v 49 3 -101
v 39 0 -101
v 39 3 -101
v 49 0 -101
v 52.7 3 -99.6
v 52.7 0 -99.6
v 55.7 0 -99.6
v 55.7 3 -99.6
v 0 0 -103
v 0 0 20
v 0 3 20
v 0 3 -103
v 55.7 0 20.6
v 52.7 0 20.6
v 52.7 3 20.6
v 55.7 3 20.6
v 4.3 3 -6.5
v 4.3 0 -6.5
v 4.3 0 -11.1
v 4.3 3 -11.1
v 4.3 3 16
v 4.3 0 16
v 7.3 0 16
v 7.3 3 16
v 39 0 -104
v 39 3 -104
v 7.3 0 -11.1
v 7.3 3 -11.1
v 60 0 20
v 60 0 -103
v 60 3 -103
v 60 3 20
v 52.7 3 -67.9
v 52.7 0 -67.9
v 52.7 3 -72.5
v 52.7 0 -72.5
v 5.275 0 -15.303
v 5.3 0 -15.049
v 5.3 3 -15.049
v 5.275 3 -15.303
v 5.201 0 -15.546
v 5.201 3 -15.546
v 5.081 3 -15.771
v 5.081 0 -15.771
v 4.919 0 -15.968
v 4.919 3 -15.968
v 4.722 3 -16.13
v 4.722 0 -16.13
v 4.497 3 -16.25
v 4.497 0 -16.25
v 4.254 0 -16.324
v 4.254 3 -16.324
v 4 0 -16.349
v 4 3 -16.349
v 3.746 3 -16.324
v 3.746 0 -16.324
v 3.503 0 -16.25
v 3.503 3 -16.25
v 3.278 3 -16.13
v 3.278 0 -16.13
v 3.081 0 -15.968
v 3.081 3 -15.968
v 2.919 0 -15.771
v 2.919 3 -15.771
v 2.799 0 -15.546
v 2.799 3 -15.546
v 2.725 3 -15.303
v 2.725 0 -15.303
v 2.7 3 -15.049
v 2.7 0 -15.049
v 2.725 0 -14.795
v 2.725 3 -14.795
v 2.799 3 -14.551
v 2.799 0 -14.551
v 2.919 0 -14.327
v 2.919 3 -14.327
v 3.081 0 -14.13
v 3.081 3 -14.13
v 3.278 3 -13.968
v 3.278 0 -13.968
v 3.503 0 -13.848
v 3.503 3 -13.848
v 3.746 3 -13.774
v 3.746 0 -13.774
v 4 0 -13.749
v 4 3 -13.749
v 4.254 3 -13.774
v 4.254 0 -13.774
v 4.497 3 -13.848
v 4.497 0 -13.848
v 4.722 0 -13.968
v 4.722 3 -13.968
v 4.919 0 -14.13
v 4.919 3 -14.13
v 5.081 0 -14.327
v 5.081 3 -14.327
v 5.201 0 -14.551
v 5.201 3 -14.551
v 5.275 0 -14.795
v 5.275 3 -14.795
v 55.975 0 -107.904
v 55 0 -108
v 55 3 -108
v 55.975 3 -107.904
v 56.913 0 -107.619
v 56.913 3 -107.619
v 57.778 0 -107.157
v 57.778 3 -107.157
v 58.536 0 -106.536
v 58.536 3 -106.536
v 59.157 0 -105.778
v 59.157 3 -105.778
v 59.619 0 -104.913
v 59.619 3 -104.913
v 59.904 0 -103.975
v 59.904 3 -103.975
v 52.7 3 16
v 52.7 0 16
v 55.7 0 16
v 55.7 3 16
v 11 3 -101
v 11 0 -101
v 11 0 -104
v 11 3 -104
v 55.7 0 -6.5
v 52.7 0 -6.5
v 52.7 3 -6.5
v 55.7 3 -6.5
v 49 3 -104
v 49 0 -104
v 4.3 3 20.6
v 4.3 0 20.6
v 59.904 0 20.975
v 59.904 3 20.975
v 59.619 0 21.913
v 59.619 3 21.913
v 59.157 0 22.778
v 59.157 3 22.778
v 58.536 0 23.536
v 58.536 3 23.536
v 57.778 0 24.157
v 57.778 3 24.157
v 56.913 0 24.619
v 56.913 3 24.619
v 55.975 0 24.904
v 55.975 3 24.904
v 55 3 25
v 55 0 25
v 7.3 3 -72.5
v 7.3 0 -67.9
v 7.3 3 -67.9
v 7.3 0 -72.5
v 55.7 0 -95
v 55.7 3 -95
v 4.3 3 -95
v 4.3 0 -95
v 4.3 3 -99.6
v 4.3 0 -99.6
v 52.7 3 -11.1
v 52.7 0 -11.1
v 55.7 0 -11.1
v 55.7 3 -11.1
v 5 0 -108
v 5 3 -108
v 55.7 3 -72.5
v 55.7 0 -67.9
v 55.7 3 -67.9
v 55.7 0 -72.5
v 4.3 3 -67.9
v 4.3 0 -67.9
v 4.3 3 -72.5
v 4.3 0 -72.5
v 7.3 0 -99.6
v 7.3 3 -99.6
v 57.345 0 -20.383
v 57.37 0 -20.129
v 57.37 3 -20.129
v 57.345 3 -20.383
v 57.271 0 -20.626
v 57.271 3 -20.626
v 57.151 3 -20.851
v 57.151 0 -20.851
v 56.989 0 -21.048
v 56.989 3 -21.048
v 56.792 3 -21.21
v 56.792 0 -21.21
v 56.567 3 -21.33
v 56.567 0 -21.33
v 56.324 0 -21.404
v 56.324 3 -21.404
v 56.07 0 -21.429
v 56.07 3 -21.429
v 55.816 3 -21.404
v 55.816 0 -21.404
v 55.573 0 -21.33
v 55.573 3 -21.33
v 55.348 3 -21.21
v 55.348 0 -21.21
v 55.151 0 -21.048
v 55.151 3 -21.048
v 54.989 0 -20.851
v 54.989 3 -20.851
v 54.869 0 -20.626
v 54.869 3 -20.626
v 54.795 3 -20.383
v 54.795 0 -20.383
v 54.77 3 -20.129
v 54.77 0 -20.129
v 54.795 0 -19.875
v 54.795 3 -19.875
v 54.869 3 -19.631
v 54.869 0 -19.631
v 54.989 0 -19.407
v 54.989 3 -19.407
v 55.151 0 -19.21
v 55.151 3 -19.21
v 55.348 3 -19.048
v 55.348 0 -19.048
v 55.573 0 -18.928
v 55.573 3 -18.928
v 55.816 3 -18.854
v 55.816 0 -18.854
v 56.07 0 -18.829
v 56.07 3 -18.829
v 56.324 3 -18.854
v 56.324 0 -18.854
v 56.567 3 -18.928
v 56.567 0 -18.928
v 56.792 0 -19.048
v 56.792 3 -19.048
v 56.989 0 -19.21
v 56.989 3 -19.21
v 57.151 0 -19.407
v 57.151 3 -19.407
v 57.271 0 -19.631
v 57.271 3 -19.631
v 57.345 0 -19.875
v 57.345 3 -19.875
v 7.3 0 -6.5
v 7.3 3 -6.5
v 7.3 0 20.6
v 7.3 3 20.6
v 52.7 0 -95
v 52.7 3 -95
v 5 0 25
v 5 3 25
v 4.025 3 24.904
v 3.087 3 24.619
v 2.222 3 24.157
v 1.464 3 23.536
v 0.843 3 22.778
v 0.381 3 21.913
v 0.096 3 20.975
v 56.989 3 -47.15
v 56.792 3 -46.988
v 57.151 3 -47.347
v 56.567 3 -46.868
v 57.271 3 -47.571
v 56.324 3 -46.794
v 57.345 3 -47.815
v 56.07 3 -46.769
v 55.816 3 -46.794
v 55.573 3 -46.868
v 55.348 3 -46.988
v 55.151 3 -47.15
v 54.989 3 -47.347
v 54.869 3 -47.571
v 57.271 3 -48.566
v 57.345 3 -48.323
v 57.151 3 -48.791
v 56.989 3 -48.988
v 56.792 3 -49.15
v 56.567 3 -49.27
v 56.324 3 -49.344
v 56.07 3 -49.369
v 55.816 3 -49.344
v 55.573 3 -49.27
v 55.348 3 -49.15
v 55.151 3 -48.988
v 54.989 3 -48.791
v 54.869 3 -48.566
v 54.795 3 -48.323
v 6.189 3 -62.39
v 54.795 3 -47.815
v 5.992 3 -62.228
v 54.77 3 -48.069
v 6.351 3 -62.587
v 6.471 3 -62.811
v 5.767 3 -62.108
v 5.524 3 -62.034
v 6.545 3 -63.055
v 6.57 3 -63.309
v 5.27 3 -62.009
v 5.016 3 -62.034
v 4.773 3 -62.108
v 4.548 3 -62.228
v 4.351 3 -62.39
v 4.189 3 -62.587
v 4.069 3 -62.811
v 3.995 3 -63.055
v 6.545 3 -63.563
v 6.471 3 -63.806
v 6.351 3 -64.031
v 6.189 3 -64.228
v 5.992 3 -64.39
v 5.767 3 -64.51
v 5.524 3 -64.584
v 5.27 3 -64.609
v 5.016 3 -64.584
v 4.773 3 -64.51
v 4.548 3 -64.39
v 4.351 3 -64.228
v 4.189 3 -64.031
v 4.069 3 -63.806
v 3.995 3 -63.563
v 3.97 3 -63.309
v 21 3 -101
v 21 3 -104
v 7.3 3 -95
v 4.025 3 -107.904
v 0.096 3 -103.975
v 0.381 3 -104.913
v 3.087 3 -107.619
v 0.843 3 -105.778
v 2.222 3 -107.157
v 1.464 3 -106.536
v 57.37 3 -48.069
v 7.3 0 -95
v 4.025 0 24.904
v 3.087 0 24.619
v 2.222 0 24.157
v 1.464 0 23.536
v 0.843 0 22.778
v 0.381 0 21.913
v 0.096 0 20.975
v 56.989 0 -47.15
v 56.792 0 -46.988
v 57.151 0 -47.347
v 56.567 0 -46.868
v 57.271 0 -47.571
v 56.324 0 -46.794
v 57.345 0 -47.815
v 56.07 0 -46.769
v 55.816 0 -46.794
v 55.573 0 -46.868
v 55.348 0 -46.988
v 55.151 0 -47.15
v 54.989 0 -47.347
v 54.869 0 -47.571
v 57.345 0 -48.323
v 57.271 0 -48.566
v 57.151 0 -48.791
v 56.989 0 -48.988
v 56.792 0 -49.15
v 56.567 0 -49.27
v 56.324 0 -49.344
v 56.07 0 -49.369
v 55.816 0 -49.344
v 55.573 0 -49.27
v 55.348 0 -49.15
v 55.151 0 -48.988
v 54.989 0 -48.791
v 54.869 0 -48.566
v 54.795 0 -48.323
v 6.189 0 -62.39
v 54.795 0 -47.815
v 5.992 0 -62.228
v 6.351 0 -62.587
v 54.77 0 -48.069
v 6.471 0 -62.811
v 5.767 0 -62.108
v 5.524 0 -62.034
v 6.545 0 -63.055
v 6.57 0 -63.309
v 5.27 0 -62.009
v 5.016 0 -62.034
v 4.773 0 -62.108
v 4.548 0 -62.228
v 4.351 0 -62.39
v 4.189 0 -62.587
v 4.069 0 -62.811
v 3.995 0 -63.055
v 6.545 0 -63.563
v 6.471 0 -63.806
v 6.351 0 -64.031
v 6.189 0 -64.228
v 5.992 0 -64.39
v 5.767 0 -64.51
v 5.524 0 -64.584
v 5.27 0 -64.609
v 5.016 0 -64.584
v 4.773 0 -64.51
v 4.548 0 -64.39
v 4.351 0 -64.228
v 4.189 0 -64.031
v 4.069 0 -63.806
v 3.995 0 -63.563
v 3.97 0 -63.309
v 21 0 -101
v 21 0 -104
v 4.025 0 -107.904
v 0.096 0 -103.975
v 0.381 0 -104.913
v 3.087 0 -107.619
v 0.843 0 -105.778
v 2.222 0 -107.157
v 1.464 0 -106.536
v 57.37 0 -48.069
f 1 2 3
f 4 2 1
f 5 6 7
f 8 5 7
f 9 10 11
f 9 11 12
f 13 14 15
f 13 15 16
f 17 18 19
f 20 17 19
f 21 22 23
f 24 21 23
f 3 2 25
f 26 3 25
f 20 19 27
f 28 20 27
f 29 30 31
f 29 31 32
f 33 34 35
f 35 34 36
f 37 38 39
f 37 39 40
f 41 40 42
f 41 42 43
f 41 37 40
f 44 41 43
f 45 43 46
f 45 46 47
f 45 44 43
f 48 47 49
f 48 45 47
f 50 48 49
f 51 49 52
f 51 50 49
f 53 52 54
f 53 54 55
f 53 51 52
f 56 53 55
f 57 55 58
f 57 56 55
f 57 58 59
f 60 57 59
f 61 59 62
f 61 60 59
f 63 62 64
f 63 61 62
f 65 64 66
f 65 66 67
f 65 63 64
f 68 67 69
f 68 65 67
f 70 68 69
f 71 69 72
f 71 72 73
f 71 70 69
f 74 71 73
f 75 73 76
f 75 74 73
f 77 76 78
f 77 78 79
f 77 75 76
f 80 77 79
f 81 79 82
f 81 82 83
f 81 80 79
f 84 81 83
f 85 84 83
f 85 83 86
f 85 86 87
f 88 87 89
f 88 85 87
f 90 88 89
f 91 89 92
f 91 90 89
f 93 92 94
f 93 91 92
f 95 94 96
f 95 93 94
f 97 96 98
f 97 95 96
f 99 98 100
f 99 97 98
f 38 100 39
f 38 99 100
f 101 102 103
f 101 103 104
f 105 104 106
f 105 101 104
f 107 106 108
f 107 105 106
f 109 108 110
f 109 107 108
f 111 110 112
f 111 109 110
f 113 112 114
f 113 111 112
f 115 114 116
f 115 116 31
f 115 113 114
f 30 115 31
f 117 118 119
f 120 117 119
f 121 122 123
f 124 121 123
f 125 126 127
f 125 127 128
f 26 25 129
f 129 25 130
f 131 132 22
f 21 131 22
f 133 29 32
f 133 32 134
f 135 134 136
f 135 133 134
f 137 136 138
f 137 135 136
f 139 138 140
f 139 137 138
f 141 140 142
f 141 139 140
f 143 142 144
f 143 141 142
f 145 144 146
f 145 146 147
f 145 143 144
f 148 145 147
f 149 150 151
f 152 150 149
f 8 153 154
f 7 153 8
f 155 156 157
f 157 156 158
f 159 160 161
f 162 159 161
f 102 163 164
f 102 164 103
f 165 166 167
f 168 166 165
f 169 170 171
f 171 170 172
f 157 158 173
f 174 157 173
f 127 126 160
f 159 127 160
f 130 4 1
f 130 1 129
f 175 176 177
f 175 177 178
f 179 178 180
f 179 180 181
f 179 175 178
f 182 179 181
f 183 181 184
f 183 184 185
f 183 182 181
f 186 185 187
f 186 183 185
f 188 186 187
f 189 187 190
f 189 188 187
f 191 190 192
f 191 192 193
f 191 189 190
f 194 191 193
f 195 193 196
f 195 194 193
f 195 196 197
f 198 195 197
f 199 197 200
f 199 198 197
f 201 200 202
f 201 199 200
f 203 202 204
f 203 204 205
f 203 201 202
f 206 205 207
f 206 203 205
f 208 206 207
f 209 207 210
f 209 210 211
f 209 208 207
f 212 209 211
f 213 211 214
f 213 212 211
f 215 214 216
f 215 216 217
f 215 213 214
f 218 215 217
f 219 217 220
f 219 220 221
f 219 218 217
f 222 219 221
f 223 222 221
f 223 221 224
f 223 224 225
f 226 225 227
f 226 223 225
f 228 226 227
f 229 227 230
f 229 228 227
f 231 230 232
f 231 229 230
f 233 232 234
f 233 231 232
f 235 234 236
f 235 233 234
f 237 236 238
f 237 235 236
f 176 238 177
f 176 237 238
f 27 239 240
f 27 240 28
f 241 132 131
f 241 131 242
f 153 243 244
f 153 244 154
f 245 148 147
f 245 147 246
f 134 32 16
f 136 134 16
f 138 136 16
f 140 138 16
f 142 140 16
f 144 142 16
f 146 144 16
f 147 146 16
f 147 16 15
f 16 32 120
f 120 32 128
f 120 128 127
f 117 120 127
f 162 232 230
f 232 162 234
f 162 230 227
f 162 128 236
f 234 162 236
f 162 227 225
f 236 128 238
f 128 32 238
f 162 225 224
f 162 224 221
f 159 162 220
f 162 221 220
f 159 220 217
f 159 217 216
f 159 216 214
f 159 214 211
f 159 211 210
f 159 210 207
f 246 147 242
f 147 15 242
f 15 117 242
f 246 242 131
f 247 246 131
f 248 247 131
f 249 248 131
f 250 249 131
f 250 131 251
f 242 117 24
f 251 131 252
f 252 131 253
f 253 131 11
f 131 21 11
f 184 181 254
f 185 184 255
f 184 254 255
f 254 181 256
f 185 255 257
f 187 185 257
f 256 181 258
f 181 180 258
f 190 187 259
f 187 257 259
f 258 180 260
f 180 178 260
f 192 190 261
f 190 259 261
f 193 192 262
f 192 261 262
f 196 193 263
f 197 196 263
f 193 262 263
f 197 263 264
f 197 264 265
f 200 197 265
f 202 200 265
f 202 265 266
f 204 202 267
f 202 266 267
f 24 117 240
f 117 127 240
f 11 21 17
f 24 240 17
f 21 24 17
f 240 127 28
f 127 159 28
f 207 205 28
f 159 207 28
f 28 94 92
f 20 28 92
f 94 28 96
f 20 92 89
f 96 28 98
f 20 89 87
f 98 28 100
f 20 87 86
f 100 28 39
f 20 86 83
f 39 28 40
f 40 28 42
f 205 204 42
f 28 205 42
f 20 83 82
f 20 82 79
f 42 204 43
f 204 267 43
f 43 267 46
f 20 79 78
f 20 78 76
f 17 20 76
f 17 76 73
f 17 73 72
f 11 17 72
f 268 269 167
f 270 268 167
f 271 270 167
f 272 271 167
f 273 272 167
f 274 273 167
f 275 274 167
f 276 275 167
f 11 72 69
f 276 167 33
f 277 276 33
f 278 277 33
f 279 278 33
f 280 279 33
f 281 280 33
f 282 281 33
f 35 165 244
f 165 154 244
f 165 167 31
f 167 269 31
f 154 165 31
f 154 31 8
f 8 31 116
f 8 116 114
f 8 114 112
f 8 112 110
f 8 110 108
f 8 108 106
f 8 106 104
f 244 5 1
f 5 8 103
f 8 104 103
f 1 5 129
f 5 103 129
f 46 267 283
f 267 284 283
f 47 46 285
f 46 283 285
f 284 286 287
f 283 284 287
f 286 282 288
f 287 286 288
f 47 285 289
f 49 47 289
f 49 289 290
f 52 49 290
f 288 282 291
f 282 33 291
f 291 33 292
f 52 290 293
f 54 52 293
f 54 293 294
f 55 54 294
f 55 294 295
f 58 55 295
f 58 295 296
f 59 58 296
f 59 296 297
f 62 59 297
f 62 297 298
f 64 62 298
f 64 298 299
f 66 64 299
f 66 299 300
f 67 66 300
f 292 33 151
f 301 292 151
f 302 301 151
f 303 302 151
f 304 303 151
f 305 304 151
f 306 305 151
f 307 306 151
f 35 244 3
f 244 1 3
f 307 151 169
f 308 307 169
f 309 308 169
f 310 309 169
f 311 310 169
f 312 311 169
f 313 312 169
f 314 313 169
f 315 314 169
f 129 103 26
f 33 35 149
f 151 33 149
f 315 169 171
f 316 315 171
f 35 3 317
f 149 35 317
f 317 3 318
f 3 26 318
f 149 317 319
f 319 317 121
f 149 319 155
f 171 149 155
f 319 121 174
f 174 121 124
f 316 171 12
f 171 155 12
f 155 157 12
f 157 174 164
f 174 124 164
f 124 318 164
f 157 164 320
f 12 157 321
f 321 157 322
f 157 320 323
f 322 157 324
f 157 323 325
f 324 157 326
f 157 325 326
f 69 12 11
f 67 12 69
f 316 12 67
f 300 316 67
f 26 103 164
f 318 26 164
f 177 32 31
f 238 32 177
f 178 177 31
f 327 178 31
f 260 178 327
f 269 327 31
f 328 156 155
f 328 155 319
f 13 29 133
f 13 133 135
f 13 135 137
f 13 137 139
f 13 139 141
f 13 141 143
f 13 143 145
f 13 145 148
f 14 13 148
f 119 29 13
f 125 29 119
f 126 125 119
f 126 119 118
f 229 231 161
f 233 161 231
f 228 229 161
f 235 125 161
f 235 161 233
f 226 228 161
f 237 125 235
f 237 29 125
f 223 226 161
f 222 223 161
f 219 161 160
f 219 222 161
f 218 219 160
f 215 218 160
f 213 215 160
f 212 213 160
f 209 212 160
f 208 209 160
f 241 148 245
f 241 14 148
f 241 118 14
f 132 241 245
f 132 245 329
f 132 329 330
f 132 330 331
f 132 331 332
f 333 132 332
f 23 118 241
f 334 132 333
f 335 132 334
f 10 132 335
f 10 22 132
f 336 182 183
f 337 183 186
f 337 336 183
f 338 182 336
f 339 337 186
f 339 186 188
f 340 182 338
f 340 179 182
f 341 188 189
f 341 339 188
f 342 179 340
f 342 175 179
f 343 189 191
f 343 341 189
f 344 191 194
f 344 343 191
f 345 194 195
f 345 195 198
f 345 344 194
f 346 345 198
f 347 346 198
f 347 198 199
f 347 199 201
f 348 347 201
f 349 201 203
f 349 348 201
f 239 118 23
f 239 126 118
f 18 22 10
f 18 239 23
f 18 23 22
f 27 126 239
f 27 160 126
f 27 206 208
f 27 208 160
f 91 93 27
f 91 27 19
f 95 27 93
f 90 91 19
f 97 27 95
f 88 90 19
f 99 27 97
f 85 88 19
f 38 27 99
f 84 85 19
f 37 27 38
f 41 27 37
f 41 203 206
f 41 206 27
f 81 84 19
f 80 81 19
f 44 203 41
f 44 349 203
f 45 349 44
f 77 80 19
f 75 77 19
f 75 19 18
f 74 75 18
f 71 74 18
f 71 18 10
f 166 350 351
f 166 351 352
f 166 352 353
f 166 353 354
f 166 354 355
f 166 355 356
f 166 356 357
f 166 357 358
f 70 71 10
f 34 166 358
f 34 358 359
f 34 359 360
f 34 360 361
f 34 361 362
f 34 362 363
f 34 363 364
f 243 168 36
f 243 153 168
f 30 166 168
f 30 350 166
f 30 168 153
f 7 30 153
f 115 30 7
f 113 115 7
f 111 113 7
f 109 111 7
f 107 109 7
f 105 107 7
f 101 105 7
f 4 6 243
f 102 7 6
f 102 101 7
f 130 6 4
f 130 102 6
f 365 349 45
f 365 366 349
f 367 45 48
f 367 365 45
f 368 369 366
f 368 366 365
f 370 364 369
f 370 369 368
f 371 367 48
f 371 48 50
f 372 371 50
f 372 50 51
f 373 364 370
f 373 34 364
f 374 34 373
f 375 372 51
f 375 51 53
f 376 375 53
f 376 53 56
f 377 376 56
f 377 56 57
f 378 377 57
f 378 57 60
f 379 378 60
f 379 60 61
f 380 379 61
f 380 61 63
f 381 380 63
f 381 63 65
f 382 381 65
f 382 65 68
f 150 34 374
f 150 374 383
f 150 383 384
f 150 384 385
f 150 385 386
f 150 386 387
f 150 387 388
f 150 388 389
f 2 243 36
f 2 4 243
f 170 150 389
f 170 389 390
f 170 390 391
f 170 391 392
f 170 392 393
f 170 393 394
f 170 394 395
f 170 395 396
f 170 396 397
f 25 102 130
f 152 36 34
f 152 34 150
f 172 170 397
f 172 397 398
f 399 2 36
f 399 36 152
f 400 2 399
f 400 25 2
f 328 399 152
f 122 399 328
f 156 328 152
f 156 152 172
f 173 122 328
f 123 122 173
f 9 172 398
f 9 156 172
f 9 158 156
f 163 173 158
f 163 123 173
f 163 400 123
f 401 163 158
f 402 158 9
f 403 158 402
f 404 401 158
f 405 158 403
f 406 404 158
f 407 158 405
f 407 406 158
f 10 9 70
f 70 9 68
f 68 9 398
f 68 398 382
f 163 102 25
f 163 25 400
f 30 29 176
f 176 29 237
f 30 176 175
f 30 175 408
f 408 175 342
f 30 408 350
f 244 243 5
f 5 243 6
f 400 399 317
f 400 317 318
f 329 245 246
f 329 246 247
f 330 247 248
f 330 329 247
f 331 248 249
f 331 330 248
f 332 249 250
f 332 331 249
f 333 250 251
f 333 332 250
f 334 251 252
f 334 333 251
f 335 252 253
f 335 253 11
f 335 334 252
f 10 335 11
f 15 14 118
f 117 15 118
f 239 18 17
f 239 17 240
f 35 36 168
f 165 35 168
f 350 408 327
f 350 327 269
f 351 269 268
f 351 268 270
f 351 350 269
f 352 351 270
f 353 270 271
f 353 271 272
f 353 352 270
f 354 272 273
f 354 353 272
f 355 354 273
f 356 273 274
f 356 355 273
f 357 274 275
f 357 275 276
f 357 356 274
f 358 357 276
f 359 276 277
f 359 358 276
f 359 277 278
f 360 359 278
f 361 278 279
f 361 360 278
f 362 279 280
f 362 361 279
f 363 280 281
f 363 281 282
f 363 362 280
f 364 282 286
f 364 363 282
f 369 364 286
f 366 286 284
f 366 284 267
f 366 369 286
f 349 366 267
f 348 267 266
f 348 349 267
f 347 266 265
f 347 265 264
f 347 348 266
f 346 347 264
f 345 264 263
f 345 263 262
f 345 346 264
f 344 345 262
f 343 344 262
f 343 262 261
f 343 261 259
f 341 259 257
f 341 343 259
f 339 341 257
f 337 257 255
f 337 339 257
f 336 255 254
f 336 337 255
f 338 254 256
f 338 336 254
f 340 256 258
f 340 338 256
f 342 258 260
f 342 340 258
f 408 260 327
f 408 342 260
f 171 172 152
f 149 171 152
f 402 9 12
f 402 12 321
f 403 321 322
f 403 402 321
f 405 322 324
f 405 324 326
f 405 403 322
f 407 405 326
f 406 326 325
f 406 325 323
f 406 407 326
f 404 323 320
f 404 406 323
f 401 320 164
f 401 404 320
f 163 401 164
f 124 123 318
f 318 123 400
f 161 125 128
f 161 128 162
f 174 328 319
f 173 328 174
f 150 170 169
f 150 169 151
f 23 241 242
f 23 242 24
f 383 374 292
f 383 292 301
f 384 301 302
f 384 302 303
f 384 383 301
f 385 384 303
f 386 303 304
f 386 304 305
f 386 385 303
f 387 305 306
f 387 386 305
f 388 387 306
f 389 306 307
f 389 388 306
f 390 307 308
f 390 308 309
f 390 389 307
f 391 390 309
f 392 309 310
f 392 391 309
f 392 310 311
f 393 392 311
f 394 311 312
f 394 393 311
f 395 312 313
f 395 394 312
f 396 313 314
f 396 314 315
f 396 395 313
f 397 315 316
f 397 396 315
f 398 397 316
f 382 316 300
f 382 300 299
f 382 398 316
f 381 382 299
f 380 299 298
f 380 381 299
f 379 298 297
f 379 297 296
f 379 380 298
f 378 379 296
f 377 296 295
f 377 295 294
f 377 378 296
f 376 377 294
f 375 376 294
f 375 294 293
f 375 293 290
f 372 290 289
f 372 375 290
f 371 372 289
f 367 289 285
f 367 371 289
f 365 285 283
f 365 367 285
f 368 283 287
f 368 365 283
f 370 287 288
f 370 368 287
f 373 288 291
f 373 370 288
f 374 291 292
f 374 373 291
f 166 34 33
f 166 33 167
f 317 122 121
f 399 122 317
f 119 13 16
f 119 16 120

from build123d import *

# Parameters (mm, degrees)
SKETCH1_R           = 1.3
SKETCH1_W           = 10
SKETCH1_H           = 3
SKETCH1_W_2         = 3
SKETCH1_H_2         = 4.6
BOSS_EXTRUDE1_DEPTH = 3


with BuildPart() as part:
    # Sketch1 → Boss-Extrude1 (new body)
    with BuildSketch(Plane(origin=(0, 0, 0), x_dir=(1, 0, 0), z_dir=(0, 1, 0))):
        with BuildLine():
            Line((0, -20), (0, 103))
            ThreePointArc((0, 103), (1.464466094, 106.535533906), (5, 108))
            Line((5, 108), (55, 108))
            ThreePointArc((55, 108), (58.535533906, 106.535533906), (60, 103))
            Line((60, 103), (60, -20))
            ThreePointArc((60, -20), (58.535533906, -23.535533906), (55, -25))
            Line((55, -25), (5, -25))
            ThreePointArc((5, -25), (1.464466094, -23.535533906), (0, -20))
        make_face()
        with Locations((56.07, 48.068886064)):
            Circle(SKETCH1_R, mode=Mode.SUBTRACT)
        with Locations((4, 15.048886064)):
            Circle(SKETCH1_R, mode=Mode.SUBTRACT)
        with Locations((56.07, 20.128886064)):
            Circle(SKETCH1_R, mode=Mode.SUBTRACT)
        with Locations((5.27, 63.308886064)):
            Circle(SKETCH1_R, mode=Mode.SUBTRACT)
        with Locations((16, 102.5)):
            Rectangle(SKETCH1_W, SKETCH1_H, mode=Mode.SUBTRACT)
        with Locations((44, 102.5)):
            Rectangle(SKETCH1_W, SKETCH1_H, mode=Mode.SUBTRACT)
        with Locations((5.8, 97.3)):
            Rectangle(SKETCH1_W_2, SKETCH1_H_2, mode=Mode.SUBTRACT)
        with Locations((5.8, 70.2)):
            Rectangle(SKETCH1_W_2, SKETCH1_H_2, mode=Mode.SUBTRACT)
        with Locations((54.2, 70.2)):
            Rectangle(SKETCH1_W_2, SKETCH1_H_2, mode=Mode.SUBTRACT)
        with Locations((54.2, 97.3)):
            Rectangle(SKETCH1_W_2, SKETCH1_H_2, mode=Mode.SUBTRACT)
        with Locations((5.8, 8.8)):
            Rectangle(SKETCH1_W_2, SKETCH1_H_2, mode=Mode.SUBTRACT)
        with Locations((5.8, -18.3)):
            Rectangle(SKETCH1_W_2, SKETCH1_H_2, mode=Mode.SUBTRACT)
        with Locations((54.2, 8.8)):
            Rectangle(SKETCH1_W_2, SKETCH1_H_2, mode=Mode.SUBTRACT)
        with Locations((54.2, -18.3)):
            Rectangle(SKETCH1_W_2, SKETCH1_H_2, mode=Mode.SUBTRACT)
    extrude(amount=BOSS_EXTRUDE1_DEPTH)


solid = part.part
